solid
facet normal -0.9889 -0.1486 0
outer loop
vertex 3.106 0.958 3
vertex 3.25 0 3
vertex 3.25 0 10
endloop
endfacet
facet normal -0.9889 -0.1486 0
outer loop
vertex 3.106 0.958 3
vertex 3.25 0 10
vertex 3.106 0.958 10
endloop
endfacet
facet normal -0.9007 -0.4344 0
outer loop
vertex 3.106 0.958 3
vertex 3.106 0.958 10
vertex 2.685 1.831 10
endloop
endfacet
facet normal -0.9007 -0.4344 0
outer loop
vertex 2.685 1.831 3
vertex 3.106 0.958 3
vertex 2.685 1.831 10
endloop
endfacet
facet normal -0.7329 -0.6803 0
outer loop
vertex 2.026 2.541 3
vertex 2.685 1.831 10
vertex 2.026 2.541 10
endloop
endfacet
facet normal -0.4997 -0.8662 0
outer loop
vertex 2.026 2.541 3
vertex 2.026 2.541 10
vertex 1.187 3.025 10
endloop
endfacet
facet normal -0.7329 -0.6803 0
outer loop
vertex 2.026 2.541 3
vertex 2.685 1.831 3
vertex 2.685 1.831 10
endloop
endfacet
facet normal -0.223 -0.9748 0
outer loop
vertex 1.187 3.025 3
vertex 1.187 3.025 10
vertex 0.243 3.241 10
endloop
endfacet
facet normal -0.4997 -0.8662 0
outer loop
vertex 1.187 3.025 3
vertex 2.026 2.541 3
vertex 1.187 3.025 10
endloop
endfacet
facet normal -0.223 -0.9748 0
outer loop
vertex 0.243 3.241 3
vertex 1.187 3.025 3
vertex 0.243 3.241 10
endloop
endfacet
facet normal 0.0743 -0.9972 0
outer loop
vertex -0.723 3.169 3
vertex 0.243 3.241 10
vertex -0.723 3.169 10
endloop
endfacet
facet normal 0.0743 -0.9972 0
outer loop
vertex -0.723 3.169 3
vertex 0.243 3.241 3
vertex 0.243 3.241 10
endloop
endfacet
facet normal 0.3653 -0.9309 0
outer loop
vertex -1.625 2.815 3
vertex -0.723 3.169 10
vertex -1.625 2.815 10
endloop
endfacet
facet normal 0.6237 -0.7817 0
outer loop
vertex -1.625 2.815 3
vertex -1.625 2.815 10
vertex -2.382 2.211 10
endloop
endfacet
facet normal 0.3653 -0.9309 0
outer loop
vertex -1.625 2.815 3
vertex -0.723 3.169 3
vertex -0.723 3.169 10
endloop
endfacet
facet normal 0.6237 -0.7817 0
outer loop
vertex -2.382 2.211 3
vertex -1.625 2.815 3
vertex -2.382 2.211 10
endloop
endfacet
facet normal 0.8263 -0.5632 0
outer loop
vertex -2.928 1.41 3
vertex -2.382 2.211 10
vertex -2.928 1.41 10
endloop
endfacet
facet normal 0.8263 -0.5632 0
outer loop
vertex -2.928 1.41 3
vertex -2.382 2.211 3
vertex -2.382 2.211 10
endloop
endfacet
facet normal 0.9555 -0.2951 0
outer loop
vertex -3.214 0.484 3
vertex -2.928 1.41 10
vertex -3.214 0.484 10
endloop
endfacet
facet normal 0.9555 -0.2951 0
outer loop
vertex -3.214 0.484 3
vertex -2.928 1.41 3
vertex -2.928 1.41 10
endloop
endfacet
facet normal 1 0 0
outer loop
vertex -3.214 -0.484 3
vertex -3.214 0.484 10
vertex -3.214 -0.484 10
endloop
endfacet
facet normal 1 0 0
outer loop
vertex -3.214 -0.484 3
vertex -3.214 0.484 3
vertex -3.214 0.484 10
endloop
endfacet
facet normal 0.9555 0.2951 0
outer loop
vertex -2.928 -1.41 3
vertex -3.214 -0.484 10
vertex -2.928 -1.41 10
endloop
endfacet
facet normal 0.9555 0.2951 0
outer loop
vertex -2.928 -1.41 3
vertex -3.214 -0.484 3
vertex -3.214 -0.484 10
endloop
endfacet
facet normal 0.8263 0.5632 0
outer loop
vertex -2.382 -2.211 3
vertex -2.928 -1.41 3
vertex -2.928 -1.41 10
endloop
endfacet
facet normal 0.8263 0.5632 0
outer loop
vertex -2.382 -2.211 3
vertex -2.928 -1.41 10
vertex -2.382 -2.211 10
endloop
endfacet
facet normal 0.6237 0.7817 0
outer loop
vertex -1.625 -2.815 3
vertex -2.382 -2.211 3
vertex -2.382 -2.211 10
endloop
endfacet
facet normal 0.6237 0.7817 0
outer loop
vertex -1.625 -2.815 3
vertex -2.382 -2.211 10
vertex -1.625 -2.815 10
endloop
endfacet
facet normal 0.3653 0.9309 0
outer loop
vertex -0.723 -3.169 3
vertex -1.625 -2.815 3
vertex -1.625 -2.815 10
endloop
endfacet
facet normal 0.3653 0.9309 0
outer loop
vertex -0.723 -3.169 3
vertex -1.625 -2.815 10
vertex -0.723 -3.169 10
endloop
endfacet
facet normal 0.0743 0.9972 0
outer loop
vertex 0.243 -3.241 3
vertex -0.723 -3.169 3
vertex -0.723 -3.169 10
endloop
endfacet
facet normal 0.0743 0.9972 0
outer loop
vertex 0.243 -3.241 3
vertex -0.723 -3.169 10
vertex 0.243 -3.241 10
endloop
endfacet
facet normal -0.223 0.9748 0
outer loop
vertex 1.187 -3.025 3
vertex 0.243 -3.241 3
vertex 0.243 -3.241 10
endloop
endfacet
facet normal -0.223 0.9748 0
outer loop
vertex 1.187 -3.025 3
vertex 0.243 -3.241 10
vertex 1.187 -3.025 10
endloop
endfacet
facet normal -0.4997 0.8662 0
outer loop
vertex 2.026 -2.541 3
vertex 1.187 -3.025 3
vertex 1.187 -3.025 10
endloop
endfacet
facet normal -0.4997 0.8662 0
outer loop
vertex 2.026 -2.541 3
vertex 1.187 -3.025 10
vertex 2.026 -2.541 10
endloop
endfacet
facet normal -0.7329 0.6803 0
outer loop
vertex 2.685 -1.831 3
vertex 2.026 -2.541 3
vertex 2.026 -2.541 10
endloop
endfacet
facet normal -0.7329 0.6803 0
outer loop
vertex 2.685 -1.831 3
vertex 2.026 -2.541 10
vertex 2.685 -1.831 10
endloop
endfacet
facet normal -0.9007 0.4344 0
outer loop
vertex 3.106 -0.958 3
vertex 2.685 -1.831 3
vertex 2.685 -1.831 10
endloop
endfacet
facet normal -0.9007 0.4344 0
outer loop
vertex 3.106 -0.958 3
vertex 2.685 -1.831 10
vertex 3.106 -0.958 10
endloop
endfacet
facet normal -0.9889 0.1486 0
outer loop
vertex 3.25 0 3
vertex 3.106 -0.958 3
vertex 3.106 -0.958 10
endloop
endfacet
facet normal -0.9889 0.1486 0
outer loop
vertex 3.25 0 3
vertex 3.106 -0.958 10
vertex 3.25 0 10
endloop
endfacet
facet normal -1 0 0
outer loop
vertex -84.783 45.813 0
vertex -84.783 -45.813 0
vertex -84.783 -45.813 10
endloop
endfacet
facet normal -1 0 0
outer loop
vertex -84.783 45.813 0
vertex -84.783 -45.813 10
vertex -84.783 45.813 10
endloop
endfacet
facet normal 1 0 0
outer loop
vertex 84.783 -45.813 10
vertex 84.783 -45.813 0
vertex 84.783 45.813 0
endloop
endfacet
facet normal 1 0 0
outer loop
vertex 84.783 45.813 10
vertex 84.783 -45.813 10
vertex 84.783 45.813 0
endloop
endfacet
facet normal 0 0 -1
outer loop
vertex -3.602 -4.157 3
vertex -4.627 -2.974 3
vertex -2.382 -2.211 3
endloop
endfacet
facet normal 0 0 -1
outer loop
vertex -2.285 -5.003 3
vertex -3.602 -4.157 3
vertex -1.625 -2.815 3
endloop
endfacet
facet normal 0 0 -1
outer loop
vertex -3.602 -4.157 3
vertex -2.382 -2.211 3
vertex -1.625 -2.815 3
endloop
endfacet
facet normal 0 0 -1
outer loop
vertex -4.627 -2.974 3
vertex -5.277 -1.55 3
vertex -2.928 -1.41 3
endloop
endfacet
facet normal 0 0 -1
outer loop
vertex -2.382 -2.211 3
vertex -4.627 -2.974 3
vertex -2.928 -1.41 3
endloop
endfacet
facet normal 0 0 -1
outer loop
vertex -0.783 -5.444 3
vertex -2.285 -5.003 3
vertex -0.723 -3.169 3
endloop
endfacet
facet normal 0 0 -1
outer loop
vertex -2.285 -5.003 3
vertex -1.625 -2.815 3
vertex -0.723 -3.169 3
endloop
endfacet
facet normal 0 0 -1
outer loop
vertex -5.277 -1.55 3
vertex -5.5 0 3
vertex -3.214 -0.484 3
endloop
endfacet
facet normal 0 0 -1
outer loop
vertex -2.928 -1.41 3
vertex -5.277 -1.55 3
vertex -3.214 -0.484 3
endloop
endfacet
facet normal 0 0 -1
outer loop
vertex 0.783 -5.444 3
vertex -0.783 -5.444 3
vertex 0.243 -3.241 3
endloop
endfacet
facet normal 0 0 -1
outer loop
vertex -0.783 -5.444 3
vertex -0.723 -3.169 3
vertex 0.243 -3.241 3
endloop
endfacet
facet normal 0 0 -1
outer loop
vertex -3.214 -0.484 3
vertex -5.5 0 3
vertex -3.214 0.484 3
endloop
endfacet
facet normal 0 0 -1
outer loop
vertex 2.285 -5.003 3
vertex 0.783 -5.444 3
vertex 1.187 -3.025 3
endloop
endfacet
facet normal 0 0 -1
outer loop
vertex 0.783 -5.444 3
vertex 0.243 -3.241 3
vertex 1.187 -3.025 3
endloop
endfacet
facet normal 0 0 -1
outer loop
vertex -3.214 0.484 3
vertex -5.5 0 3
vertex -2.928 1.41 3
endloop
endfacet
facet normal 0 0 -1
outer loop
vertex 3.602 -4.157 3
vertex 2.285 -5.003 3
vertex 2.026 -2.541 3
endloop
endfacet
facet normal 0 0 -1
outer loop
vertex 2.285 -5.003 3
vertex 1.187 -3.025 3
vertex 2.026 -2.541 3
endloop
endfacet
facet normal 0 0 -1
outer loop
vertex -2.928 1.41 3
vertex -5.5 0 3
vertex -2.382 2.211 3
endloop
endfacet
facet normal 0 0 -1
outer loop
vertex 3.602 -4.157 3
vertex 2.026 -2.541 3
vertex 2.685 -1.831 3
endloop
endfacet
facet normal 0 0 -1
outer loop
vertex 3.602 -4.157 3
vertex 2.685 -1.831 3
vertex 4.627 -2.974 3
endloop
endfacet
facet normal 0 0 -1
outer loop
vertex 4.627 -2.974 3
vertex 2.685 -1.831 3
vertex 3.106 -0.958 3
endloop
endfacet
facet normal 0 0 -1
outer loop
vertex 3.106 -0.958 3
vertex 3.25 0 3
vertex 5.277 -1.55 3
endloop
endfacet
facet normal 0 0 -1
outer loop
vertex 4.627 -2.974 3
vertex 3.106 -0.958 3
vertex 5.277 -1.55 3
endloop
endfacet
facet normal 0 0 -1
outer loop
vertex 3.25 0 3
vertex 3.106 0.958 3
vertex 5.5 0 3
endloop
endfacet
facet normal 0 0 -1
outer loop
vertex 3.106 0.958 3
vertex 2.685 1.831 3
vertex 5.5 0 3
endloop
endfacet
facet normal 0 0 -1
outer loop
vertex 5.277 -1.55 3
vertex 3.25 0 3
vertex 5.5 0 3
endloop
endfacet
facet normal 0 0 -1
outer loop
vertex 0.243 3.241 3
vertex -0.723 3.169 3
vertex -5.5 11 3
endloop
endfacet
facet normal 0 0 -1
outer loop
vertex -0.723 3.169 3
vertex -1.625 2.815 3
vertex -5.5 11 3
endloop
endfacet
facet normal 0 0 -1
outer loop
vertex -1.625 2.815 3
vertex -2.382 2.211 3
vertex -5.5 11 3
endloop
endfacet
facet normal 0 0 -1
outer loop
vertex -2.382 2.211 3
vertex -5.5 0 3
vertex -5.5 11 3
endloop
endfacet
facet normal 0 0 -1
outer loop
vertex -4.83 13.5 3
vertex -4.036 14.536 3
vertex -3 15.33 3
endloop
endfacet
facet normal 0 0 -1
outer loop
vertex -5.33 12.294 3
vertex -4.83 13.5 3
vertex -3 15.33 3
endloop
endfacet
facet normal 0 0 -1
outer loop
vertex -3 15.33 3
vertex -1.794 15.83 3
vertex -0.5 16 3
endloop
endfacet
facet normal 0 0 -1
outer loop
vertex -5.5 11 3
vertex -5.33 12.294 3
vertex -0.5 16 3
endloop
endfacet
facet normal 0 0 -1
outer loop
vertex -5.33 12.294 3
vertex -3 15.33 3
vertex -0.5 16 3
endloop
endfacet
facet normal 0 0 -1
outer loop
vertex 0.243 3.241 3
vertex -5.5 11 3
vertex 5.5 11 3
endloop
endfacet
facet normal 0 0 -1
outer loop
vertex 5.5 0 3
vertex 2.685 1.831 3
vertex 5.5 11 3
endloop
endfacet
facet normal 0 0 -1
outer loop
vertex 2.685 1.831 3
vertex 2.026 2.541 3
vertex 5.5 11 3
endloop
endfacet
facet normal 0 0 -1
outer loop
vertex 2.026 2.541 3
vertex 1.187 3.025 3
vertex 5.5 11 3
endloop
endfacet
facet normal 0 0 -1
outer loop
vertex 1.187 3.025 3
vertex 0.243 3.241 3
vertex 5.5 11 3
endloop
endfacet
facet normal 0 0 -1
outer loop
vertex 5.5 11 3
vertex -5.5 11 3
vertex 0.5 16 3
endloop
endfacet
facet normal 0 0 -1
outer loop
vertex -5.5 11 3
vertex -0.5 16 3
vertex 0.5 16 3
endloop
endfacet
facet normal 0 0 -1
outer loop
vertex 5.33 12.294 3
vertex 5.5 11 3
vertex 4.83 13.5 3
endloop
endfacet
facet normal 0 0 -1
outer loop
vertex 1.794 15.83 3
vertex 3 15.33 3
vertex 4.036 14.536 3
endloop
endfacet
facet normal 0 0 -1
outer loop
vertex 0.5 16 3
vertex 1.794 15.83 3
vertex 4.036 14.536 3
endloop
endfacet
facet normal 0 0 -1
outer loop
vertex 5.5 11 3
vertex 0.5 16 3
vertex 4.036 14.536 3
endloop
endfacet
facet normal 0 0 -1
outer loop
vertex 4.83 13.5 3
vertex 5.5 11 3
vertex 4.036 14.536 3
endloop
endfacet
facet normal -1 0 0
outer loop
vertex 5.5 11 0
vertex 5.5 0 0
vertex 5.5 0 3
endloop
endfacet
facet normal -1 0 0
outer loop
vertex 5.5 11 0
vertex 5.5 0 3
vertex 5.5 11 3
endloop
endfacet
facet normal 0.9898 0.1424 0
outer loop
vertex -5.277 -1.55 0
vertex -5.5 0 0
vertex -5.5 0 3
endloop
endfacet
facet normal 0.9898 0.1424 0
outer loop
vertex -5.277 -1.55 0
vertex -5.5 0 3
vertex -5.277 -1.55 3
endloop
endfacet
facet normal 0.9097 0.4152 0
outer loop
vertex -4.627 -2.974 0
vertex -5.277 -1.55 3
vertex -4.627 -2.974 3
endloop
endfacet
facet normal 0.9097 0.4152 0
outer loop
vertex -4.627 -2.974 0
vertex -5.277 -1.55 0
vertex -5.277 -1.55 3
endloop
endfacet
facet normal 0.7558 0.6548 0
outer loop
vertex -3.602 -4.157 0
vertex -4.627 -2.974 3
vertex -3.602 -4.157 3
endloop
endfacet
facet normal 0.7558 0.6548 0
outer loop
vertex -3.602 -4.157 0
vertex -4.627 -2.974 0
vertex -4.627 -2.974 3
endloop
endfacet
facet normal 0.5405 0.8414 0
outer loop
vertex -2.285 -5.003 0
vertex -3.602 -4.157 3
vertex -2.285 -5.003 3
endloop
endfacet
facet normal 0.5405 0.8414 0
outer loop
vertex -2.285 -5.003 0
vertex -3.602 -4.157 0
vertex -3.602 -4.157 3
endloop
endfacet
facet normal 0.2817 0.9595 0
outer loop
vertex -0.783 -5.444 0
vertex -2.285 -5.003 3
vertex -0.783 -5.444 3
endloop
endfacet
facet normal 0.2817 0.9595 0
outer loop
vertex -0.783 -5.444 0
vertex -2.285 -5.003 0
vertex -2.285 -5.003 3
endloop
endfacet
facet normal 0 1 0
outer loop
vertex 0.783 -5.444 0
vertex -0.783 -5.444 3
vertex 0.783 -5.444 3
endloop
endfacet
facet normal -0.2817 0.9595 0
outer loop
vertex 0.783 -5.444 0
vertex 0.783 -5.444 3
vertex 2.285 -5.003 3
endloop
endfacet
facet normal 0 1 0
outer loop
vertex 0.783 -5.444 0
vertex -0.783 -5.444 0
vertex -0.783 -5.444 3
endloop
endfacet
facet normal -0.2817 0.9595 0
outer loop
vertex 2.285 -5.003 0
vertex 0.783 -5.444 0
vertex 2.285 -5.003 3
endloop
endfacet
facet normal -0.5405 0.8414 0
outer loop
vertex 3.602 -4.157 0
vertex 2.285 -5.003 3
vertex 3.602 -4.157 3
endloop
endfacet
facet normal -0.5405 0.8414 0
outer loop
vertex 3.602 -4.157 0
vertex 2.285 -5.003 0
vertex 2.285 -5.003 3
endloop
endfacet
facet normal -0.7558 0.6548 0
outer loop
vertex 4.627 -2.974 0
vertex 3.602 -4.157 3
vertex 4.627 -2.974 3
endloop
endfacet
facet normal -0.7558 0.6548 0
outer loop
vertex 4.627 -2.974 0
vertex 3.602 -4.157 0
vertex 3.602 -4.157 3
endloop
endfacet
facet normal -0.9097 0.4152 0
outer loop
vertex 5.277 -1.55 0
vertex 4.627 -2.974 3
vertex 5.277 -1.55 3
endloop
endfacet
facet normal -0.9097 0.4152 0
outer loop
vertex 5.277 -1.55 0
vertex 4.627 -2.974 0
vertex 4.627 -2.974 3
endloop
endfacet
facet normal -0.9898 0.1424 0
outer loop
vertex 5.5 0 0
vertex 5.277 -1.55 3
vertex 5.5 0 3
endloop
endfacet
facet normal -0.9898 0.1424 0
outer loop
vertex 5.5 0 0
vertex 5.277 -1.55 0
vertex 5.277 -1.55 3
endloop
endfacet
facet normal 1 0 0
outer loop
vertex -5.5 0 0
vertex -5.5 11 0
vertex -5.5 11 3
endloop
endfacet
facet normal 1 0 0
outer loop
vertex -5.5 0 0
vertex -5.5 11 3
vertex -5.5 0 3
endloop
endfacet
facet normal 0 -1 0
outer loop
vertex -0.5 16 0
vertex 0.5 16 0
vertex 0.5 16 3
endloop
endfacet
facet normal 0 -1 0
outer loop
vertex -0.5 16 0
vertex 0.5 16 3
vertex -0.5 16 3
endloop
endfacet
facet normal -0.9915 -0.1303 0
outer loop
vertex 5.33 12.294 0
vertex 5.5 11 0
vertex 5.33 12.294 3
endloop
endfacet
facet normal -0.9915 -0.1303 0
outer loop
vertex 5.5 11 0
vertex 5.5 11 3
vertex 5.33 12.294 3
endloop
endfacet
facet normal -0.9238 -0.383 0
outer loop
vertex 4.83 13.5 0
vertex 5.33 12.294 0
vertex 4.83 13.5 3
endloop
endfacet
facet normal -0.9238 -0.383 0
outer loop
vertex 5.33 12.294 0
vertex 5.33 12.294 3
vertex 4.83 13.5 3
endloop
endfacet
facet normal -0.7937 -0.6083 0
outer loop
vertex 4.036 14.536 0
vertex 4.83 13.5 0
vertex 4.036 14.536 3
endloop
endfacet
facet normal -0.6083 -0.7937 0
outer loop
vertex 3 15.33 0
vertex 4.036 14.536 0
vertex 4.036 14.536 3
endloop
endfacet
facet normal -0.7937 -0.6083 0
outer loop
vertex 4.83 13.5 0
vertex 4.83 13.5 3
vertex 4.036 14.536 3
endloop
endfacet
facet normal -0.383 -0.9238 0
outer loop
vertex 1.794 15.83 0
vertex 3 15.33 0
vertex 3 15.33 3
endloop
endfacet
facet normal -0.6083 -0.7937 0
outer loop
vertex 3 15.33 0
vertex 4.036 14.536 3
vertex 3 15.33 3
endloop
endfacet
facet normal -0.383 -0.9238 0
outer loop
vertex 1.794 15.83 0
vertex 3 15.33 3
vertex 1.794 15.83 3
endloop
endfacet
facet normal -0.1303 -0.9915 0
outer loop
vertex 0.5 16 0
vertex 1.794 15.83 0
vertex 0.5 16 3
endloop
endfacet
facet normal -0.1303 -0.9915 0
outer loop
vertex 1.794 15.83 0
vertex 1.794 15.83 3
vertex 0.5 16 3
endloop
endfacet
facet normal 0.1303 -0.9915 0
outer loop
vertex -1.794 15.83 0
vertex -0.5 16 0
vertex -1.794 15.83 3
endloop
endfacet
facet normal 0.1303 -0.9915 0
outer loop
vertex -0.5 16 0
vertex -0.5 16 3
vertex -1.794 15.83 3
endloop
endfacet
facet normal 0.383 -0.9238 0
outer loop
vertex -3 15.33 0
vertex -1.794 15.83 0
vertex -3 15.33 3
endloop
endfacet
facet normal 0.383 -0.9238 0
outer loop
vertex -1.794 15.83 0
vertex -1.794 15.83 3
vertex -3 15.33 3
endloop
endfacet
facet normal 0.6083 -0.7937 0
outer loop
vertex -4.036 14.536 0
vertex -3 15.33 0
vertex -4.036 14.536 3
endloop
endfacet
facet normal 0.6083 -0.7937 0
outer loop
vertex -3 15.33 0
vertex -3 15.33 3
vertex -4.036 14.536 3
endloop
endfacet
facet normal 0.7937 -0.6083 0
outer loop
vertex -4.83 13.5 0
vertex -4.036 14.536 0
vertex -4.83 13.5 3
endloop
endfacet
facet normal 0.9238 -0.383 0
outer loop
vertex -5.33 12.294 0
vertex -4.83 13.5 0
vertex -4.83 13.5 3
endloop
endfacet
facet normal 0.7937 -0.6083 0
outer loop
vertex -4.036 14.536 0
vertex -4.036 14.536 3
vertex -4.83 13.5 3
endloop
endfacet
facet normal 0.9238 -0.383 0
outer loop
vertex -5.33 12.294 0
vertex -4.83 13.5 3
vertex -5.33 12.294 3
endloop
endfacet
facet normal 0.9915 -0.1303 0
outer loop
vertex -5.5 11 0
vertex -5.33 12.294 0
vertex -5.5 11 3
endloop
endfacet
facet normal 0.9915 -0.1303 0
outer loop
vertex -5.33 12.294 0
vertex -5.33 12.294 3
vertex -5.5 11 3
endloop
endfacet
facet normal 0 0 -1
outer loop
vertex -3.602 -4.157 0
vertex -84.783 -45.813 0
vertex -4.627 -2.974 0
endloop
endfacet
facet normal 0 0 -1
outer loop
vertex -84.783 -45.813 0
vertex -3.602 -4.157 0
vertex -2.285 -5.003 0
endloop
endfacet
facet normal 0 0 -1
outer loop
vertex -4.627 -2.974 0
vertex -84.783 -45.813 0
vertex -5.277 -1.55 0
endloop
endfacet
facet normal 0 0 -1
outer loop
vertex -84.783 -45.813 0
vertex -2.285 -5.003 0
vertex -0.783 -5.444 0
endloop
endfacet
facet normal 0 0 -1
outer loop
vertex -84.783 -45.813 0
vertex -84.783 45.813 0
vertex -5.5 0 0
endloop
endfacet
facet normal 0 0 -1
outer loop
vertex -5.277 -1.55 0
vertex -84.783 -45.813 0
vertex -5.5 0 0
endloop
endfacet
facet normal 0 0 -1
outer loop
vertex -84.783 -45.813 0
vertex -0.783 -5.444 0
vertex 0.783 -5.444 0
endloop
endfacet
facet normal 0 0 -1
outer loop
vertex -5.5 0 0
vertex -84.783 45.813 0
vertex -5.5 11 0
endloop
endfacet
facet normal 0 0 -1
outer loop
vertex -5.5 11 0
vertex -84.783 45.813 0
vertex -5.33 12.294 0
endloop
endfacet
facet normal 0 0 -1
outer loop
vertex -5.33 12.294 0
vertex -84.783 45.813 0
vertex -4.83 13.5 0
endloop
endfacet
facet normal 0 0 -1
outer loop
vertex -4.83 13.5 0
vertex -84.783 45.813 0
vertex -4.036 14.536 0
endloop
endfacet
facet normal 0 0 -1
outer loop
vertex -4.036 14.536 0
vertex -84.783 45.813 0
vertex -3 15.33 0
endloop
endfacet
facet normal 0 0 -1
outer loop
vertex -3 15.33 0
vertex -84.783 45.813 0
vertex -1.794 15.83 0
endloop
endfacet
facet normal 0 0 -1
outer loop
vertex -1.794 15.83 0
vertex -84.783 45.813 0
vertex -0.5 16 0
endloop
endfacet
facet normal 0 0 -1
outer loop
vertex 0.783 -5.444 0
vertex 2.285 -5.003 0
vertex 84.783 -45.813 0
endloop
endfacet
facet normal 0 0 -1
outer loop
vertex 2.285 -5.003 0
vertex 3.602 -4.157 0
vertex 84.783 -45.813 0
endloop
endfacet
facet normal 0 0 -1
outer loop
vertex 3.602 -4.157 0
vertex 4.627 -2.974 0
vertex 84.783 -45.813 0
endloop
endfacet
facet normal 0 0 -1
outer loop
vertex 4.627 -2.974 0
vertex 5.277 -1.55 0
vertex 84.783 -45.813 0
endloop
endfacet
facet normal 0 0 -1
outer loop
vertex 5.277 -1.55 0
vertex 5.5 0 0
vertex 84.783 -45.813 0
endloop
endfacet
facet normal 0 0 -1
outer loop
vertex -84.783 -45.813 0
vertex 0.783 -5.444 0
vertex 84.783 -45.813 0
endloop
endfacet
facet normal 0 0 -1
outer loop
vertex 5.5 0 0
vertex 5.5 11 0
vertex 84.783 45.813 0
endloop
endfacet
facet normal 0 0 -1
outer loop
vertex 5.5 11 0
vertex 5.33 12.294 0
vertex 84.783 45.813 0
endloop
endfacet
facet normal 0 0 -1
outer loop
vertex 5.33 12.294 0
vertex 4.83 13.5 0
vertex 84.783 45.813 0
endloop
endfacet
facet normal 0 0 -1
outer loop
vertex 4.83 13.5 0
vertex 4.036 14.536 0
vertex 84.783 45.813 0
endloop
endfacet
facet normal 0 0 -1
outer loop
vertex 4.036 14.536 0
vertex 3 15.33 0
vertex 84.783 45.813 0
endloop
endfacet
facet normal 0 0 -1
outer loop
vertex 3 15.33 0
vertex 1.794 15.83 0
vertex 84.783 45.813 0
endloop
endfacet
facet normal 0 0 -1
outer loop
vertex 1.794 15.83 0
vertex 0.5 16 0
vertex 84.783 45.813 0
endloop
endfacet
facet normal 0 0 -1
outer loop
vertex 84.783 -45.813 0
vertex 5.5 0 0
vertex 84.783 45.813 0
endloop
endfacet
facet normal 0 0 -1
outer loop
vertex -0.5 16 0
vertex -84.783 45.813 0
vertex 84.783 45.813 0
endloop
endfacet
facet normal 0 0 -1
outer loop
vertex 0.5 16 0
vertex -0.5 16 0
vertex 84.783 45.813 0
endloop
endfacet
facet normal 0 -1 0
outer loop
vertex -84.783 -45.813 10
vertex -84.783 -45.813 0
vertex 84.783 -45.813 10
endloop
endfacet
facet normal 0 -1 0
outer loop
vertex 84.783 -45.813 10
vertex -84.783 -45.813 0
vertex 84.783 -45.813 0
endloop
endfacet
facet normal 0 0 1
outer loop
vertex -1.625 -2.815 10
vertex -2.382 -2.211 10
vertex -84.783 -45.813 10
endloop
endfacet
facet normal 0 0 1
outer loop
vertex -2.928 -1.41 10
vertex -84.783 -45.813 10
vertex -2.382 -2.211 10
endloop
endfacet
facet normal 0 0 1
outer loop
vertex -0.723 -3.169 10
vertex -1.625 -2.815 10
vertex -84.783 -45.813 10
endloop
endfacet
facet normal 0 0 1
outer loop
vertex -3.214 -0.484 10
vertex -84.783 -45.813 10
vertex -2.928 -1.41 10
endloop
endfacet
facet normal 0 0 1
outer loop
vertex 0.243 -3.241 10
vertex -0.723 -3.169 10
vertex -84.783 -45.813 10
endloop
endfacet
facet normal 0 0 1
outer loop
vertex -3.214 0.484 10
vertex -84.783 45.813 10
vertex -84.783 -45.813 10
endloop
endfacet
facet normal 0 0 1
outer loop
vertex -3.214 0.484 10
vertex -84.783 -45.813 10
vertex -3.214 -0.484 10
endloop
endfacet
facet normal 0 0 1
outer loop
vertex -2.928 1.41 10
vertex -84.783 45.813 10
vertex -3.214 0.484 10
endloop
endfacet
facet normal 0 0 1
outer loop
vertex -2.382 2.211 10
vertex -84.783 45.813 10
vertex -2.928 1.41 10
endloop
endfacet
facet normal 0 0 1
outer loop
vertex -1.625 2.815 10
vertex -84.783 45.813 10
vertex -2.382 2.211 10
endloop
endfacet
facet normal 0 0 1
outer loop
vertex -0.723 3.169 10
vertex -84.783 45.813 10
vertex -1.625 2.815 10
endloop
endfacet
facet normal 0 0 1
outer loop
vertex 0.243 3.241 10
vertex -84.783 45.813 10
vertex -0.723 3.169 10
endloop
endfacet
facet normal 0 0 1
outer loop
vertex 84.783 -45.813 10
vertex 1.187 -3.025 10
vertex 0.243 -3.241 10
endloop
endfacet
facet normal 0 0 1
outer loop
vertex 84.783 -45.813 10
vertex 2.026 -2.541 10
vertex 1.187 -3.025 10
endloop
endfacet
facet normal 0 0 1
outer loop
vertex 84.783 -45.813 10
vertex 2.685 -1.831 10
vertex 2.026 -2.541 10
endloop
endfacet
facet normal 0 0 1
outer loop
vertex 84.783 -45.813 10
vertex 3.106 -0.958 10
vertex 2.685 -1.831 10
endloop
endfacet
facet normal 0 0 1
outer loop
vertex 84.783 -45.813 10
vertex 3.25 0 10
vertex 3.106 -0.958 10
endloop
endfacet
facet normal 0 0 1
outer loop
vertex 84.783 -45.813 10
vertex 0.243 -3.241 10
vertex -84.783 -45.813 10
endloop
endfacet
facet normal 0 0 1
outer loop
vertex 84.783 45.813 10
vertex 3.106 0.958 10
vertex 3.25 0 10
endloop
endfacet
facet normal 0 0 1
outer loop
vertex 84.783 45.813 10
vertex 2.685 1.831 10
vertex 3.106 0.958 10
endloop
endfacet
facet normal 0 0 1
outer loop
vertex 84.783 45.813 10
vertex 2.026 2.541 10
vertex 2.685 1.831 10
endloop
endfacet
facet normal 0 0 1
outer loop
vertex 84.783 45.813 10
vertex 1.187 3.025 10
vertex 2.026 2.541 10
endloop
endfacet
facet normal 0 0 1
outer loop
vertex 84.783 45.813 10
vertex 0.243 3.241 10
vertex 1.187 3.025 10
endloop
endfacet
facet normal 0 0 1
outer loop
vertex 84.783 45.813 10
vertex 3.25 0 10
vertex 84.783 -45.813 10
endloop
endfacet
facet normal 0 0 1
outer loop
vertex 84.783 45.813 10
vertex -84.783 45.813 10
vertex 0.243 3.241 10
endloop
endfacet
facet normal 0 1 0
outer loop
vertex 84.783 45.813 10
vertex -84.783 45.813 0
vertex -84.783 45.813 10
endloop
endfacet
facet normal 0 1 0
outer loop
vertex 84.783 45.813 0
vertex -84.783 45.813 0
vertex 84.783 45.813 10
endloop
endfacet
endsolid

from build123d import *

# Parameters (mm, degrees)
F0_W     = 169.565908
F0_H     = 91.625672
F0_R     = 3.25
F1_DEPTH = 10
F2_R     = 3.25
F3_DEPTH = 3
F4_R     = 5


with BuildPart() as f1:
    # F0 (on Top) → F1 (new body)
    with BuildSketch(Plane.XY):
        Rectangle(F0_W, F0_H)
        Circle(F0_R, mode=Mode.SUBTRACT)
    extrude(amount=F1_DEPTH)

    # F2 (on face) → F3 (cut)
    with BuildSketch(Plane.XY):
        with BuildLine():
            ThreePointArc((-5.5, 0), (0, 5.5), (5.5, 0))
            Line((5.5, 0), (5.5, 16))
            Line((5.5, 16), (0, 16))
            Line((0, 16), (-5.5, 16))
            Line((-5.5, 16), (-5.5, 0))
        make_face()
        with BuildLine():
            ThreePointArc((-5.5, 0), (0, -5.5), (5.5, 0))
            ThreePointArc((5.5, 0), (0, 5.5), (-5.5, 0))
        make_face()
        Circle(F2_R, mode=Mode.SUBTRACT)
    extrude(amount=F3_DEPTH, mode=Mode.SUBTRACT)

    # F4
    f4_edges = [f1.edges().sort_by_distance(p)[0] for p in [
        (5.5, 16, 1.5),
        (-5.5, 16, 1.5),
    ]]
    fillet(f4_edges, radius=F4_R)


solid = f1.part
